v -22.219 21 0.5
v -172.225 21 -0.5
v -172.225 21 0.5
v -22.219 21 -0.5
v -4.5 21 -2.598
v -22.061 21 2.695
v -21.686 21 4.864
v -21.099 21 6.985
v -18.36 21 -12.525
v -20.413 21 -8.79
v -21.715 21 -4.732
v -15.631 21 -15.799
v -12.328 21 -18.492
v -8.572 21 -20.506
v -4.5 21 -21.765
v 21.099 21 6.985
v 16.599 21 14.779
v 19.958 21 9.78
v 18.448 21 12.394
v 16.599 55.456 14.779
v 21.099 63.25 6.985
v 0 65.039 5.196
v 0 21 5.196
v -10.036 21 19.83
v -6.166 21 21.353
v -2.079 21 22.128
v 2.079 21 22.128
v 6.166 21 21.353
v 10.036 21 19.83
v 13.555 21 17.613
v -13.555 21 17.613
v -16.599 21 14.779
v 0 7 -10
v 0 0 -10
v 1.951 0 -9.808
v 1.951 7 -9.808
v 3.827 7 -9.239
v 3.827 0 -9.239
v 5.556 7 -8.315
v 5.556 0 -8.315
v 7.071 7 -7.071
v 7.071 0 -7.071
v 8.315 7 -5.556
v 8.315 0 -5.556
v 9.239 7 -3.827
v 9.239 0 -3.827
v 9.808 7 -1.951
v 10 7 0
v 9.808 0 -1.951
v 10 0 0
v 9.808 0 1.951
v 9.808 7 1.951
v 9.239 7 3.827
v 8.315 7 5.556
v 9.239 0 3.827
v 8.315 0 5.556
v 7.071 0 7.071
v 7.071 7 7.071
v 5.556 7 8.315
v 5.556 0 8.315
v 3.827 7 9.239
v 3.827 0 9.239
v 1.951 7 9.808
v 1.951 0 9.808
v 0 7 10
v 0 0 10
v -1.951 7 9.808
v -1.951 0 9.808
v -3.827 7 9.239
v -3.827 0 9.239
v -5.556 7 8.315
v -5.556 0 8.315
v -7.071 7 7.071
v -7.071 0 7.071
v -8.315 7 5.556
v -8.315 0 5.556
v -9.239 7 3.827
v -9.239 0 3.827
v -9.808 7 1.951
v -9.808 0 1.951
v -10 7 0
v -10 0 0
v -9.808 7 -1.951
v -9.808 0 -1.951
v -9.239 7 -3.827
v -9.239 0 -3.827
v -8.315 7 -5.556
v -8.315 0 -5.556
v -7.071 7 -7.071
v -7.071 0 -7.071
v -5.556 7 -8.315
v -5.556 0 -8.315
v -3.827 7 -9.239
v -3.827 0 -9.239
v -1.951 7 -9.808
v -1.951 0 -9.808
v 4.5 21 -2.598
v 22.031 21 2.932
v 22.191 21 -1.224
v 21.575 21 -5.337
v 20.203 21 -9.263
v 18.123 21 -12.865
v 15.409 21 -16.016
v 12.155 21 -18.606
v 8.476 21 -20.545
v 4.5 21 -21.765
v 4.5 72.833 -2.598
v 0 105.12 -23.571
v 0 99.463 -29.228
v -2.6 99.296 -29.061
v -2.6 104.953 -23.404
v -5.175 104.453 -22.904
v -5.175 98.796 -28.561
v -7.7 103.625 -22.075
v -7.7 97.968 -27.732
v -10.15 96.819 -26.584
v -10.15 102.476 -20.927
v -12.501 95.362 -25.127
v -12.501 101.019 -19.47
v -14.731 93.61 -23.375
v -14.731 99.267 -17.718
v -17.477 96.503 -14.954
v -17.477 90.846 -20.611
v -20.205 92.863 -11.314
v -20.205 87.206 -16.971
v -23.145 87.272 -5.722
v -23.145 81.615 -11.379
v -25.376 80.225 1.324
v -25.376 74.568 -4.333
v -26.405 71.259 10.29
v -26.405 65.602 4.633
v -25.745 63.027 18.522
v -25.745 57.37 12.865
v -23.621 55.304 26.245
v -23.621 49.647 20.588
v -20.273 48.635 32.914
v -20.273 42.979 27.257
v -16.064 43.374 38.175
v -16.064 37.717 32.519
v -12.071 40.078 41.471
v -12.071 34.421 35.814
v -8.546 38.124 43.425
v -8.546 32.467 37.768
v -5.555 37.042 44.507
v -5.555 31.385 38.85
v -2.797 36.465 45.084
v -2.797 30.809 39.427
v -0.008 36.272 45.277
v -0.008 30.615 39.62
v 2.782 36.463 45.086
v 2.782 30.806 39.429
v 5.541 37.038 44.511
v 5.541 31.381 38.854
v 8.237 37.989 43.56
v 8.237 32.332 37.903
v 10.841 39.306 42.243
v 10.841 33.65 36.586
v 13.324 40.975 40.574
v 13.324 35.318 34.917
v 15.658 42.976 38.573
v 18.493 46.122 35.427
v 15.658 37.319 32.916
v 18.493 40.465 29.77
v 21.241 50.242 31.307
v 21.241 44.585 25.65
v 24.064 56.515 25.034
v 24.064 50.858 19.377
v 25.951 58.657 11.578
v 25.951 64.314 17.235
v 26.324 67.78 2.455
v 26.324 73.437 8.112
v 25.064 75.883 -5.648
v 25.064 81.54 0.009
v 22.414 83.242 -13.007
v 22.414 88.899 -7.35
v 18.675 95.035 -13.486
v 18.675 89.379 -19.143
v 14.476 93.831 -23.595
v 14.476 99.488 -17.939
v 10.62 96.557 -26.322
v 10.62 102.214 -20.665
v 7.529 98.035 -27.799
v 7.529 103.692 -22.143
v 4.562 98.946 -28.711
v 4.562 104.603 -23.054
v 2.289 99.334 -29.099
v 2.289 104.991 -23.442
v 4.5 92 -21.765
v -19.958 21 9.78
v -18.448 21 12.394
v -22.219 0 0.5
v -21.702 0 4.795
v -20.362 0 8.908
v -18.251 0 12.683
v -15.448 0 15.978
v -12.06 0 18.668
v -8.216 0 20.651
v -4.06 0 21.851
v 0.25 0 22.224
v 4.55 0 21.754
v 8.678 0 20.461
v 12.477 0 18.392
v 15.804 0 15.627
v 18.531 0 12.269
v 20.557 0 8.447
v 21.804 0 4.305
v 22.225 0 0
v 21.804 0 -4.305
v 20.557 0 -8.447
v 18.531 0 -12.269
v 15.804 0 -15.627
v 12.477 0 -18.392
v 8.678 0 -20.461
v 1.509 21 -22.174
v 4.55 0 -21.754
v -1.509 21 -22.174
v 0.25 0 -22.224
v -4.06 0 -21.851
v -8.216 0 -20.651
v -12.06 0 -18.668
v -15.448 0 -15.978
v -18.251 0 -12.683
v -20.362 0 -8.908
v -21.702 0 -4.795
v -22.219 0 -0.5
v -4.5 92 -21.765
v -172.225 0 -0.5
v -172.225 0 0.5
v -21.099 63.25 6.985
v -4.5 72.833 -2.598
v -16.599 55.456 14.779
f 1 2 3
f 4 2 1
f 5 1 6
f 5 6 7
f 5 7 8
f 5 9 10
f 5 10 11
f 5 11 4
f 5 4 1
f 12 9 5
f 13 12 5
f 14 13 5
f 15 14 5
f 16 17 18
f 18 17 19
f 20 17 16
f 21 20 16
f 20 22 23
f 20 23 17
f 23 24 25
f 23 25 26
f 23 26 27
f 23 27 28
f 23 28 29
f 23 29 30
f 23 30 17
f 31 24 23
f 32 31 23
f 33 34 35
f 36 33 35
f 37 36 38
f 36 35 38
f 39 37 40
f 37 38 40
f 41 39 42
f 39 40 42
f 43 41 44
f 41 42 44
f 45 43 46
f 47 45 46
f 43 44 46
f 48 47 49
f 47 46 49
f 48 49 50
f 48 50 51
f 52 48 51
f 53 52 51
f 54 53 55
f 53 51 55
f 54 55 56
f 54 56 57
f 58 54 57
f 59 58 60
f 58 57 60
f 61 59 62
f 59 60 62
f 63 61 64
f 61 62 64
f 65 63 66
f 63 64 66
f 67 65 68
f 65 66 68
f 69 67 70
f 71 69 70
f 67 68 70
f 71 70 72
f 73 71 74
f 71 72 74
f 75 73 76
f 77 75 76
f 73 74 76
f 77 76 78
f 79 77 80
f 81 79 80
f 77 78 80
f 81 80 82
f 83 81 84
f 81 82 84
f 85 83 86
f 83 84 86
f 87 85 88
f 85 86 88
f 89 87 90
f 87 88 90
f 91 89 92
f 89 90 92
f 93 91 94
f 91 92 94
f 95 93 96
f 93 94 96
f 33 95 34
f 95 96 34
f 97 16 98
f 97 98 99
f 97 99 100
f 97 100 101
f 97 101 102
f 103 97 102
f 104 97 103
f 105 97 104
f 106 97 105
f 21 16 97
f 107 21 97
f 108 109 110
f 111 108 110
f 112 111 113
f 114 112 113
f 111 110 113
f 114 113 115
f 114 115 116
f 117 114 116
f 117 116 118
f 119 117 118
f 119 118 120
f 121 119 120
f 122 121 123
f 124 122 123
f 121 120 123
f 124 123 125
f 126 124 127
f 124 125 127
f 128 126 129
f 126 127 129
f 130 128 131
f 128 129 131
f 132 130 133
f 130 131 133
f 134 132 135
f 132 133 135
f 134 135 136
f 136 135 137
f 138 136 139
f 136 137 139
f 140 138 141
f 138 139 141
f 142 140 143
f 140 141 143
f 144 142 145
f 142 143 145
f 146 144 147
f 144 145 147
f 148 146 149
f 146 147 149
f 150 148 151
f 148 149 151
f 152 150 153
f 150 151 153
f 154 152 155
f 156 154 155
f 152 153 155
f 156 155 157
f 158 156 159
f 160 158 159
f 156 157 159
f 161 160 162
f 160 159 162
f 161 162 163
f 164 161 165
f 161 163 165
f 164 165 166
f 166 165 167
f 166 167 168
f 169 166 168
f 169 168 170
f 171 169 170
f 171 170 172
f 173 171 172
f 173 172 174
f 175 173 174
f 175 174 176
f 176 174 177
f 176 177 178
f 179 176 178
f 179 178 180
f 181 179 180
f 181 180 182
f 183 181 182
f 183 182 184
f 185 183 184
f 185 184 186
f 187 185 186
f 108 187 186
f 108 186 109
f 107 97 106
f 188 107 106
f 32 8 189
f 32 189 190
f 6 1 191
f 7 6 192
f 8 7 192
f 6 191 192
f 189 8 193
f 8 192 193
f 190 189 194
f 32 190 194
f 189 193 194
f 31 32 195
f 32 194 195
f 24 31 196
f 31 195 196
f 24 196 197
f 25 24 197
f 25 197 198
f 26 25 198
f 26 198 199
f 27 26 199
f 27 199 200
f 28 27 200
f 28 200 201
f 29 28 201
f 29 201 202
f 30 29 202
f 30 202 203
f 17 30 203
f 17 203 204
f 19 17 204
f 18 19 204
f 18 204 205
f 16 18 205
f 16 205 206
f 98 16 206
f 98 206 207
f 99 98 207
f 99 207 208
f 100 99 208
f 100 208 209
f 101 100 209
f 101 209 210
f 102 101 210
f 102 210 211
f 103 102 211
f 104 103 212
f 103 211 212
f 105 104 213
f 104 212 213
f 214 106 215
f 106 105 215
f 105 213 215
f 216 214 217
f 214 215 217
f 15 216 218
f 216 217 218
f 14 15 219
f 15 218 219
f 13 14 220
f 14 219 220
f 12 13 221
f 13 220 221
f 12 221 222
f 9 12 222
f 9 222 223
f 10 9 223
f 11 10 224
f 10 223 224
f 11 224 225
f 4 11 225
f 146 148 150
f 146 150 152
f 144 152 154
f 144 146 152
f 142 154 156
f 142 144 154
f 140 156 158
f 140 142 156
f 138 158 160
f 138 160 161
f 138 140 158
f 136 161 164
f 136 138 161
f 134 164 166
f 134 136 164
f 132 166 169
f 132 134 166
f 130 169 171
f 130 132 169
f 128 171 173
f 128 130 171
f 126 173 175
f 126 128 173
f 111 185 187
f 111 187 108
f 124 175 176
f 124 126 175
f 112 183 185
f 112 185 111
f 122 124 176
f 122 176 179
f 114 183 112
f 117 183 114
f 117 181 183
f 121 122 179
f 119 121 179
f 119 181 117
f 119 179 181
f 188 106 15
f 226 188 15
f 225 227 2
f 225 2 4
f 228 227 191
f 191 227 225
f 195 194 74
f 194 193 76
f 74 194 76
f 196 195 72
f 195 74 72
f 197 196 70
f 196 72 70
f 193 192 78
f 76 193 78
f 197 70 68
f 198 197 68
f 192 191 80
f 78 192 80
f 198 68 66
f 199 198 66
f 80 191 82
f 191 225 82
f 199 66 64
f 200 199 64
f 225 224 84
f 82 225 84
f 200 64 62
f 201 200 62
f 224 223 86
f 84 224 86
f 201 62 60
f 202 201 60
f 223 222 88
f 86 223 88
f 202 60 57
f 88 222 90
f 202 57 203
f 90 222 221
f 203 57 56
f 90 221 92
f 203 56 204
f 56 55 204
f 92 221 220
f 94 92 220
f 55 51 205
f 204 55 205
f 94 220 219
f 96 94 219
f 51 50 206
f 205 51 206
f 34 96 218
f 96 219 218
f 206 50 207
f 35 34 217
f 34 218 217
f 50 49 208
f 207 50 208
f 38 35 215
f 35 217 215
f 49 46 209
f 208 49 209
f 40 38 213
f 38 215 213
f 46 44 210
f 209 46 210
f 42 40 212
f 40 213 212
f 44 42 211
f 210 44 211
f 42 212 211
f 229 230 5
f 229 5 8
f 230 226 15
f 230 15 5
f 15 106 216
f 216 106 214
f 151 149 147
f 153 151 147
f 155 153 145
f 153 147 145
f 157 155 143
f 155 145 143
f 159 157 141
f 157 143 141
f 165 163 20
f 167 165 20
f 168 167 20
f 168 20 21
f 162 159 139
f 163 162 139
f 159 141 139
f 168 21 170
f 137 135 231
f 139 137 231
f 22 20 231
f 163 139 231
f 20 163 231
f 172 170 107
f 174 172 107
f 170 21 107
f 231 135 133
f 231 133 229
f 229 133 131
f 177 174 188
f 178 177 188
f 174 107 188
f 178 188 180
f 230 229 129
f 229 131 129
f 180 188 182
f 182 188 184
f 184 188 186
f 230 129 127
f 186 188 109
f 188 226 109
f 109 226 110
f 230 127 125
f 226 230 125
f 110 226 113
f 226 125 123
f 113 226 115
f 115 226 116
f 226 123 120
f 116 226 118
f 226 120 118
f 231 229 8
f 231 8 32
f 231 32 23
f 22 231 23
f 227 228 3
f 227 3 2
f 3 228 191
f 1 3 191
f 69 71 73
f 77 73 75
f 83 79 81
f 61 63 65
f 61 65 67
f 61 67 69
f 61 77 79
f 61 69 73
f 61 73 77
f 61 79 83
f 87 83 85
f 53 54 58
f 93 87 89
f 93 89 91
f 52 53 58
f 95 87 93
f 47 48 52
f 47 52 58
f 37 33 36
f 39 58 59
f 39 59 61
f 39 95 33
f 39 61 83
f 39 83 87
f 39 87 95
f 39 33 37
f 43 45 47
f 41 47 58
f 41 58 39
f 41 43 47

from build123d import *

# Parameters (mm, degrees)
SKETCH1_R               = 22.225
BOSS_EXTRUDE1_DEPTH     = 21
SKETCH3_R               = 10
CUT_EXTRUDE1_DEPTH      = 7
BOSS_EXTRUDE2_DEPTH     = 71
SKETCH5_W               = 150
SKETCH5_H               = 180
CUT_EXTRUDE2_DEPTH      = 72
SKETCH6_RX              = 48.683272643
SKETCH6_RY              = 26.408297454
BOSS_EXTRUDE3_DEPTH     = 8
BOSS_EXTRUDE4_OUTLINE_W = 150.225
BOSS_EXTRUDE4_OUTLINE_H = 1
BOSS_EXTRUDE4_DEPTH     = 21


# Read off the part's stored shape, not the designer's step: Boss-Extrude4
with BuildPart() as part:
    # Sketch1 → Boss-Extrude1 (new body)
    with BuildSketch(Plane(origin=(0, 0, 0), x_dir=(1, 0, 0), z_dir=(0, 1, 0))):
        with Locations(Location((0, 0, 0), (0, 0, 90))):
            Circle(SKETCH1_R)
    extrude(amount=BOSS_EXTRUDE1_DEPTH)

    # Sketch3 → Cut-Extrude1 (cut)
    with BuildSketch(Plane.XZ):
        with Locations(Location((0, 0, 0), (0, 0, 270))):
            Circle(SKETCH3_R)
    extrude(amount=-CUT_EXTRUDE1_DEPTH, mode=Mode.SUBTRACT)

    # Sketch4 → Boss-Extrude2 (add)
    with BuildSketch(Plane(origin=(0, 21, 0), x_dir=(1, 0, 0), z_dir=(0, 1, 0))):
        Polygon((0, 0), (-4.5, 0), (-4.5, 2.598076211), (-21.098752445, -6.985217981), (-16.598752445, -14.779446615), (0, -5.196152423), (-2.25, -3.897114317), align=None)
        Polygon((4.5, 0), (0, 0), (2.25, -3.897114317), (0, -5.196152423), (16.598752445, -14.779446615), (21.098752445, -6.985217981), (4.5, 2.598076211), align=None)
        Polygon((-2.25, 3.897114317), (0, 0), (2.25, 3.897114317), (4.5, 2.598076211), (4.5, 21.764664597), (-4.5, 21.764664597), (-4.5, 2.598076211), align=None)
        Polygon((2.25, -3.897114317), (0, 0), (-2.25, -3.897114317), (0, -5.196152423), align=None)
        Polygon((-4.5, 2.598076211), (-4.5, 0), (0, 0), (-2.25, 3.897114317), align=None)
        Polygon((2.25, 3.897114317), (0, 0), (4.5, 0), (4.5, 2.598076211), align=None)
    extrude(amount=BOSS_EXTRUDE2_DEPTH)

    # Sketch5 → Cut-Extrude2 (cut)
    with BuildSketch(Plane(origin=(0, 35.117667702, 35.117667702), x_dir=(-1, 0, 0), z_dir=(0, -0.7071067811865488, -0.7071067811865464))):
        Rectangle(SKETCH5_W, SKETCH5_H)
    extrude(amount=-CUT_EXTRUDE2_DEPTH, mode=Mode.SUBTRACT)

    # Sketch6 → Boss-Extrude3 (add)
    with BuildSketch(Plane(origin=(0, 35.117667702, 35.117667702), x_dir=(1, 0, 0), z_dir=(0, 0.7071067811865487, 0.7071067811865464))):
        with Locations(Location((0, 42.315412714), (0, 0, 90))):
            Ellipse(SKETCH6_RX, SKETCH6_RY)
    extrude(amount=BOSS_EXTRUDE3_DEPTH)

    # Boss-Extrude4 outline → Boss-Extrude4 (add)
    with BuildSketch(Plane(origin=(0, 0, 0), x_dir=(1, 0, 0), z_dir=(0, 1, 0))):
        with Locations((-97.1125, 0)):
            Rectangle(BOSS_EXTRUDE4_OUTLINE_W, BOSS_EXTRUDE4_OUTLINE_H)
    extrude(amount=BOSS_EXTRUDE4_DEPTH)


solid = part.part
